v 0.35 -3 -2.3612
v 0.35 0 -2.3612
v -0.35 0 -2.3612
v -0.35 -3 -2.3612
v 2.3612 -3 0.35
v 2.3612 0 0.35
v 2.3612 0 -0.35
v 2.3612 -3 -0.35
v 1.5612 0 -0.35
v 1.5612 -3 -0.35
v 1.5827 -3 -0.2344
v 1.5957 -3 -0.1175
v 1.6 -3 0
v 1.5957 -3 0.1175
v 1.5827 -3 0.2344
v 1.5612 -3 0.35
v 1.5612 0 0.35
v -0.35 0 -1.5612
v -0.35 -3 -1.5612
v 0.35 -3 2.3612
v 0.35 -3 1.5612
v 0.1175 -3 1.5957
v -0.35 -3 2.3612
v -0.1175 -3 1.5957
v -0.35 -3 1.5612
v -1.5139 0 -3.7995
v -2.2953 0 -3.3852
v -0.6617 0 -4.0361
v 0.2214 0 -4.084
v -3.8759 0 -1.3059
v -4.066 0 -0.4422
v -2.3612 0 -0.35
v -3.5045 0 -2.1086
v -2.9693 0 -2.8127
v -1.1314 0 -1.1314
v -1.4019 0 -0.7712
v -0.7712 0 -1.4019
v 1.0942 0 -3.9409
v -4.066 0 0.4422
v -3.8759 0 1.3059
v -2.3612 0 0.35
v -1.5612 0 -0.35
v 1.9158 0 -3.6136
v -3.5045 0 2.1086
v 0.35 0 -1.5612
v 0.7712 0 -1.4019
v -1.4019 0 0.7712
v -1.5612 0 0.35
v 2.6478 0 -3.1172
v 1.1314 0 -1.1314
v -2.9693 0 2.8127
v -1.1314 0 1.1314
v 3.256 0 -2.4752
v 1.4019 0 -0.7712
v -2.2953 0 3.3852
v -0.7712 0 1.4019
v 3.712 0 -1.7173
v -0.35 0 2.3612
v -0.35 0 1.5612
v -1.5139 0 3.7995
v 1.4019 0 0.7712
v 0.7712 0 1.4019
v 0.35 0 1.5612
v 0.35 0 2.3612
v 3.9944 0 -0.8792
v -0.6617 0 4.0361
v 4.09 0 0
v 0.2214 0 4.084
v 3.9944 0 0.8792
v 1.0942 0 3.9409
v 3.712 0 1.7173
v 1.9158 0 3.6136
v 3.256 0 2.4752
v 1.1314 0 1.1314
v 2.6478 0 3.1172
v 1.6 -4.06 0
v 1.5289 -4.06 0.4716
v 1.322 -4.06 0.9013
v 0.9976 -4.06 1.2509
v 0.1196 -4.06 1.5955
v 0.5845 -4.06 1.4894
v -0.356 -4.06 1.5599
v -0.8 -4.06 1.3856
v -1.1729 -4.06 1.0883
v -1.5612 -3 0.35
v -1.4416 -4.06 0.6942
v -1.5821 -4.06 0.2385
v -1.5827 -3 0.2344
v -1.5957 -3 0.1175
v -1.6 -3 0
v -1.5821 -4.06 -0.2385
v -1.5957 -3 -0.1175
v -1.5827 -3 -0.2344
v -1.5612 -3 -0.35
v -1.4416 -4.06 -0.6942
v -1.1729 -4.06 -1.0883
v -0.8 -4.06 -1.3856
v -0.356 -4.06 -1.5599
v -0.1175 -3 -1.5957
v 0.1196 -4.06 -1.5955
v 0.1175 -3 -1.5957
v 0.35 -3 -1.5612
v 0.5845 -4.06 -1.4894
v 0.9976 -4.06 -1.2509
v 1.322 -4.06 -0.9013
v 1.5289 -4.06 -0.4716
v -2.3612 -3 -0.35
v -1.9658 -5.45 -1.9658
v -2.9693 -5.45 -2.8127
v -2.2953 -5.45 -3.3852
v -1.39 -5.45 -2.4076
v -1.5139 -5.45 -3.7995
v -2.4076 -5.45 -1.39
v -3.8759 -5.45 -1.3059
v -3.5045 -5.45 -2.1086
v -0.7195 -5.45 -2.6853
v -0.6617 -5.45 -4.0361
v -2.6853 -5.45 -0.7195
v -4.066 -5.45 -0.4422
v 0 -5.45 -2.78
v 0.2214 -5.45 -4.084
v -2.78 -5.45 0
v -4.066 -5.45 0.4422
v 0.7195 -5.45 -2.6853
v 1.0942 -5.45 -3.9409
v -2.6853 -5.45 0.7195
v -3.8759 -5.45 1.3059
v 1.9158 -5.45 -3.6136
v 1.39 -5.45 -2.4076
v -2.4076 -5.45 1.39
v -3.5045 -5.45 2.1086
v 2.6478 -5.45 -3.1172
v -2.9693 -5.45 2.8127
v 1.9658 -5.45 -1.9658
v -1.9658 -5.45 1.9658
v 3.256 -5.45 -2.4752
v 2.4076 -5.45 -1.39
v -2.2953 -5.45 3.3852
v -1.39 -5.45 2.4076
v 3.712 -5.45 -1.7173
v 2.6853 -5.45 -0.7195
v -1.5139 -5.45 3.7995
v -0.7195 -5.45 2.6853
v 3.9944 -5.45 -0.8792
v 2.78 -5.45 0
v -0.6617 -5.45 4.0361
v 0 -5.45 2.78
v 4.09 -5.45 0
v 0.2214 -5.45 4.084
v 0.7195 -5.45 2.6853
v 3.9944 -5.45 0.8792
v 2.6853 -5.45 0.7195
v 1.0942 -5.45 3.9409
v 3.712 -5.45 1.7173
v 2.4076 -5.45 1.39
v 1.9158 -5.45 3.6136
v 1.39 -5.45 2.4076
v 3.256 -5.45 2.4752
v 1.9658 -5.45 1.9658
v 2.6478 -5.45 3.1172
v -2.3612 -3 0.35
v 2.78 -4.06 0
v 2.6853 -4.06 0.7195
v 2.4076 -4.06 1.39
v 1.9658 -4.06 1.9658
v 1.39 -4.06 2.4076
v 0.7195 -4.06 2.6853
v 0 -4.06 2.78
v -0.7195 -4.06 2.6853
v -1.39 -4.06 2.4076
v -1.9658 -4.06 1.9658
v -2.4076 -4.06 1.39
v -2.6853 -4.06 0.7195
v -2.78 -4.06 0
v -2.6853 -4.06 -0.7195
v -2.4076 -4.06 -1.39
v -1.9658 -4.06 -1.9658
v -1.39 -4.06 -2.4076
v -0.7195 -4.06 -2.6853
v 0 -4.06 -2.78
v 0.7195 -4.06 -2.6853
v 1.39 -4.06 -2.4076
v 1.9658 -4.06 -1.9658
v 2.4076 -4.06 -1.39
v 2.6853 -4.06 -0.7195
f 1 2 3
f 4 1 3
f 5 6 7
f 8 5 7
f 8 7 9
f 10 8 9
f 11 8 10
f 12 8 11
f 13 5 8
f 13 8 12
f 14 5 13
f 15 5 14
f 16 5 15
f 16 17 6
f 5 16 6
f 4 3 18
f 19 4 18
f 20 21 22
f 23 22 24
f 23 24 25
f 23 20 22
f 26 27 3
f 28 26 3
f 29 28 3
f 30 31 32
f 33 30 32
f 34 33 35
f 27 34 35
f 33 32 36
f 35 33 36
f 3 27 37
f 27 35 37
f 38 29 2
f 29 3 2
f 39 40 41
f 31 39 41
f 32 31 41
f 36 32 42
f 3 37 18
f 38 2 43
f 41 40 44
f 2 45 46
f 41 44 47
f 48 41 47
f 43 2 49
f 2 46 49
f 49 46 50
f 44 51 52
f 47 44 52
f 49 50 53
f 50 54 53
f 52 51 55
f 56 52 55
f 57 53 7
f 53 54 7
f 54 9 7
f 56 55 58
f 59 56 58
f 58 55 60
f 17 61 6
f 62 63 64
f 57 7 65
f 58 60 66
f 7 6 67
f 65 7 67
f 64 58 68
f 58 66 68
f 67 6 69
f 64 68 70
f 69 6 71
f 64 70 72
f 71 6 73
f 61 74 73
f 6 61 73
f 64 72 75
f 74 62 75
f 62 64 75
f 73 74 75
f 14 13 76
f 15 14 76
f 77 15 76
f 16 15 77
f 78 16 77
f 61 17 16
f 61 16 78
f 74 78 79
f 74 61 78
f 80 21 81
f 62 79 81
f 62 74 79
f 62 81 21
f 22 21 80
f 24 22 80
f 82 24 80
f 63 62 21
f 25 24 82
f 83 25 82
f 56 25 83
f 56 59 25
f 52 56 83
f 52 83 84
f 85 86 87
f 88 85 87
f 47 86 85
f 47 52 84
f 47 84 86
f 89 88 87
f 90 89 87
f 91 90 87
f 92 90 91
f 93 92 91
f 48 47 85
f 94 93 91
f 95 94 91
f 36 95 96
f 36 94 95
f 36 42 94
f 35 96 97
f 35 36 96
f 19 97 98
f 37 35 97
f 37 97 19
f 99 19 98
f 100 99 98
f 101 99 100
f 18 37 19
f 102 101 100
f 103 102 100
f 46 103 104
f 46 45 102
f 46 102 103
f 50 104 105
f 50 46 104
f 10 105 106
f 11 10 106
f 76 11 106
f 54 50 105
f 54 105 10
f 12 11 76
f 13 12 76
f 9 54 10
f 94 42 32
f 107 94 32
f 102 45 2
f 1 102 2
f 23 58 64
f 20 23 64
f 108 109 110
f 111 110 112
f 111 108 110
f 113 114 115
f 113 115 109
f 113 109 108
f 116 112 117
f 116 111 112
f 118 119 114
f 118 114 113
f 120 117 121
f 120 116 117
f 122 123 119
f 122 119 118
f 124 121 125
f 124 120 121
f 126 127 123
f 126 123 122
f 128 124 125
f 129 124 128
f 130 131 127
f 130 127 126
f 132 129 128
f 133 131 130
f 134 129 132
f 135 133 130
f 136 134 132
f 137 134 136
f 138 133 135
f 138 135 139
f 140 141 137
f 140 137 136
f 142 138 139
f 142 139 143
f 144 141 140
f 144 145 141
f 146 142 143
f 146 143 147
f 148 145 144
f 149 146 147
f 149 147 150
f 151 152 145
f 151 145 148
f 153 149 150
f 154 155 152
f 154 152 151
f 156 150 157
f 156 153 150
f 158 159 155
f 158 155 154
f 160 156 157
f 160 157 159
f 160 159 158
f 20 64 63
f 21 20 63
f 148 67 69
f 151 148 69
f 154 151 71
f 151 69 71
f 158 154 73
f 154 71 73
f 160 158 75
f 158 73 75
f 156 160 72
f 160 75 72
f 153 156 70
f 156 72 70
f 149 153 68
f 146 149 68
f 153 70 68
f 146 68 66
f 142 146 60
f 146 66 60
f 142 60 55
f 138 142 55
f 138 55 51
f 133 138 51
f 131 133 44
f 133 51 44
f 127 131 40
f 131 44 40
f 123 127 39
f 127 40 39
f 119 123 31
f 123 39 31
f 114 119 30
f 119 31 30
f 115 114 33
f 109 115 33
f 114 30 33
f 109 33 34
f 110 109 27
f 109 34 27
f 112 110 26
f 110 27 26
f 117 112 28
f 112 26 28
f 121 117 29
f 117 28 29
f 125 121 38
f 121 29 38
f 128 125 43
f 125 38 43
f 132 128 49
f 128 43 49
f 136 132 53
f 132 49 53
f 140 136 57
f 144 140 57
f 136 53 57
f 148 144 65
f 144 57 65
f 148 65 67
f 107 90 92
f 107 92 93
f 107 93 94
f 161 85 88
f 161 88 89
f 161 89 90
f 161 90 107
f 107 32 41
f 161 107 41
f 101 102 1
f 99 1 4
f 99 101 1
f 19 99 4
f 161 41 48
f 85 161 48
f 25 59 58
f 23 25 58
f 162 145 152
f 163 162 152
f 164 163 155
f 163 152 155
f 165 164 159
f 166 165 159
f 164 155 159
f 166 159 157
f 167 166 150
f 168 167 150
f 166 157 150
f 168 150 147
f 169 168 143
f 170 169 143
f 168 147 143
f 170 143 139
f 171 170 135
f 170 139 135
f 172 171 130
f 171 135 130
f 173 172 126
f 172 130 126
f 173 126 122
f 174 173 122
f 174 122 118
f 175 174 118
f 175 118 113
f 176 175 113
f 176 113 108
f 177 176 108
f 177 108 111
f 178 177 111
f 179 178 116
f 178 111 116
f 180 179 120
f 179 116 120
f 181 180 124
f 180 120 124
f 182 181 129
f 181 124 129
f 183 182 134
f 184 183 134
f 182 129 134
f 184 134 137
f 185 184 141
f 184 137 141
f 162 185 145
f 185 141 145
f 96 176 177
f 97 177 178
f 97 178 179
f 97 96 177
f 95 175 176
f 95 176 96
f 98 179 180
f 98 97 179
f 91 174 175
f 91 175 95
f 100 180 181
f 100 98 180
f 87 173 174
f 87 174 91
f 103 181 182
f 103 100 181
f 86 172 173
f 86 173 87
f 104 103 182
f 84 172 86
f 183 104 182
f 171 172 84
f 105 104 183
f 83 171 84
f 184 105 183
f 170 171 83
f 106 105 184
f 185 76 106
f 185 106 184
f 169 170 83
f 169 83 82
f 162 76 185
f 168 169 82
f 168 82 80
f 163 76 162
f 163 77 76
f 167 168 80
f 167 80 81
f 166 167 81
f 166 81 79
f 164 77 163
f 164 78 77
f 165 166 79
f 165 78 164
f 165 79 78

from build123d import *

# Parameters (mm, degrees)
F0_R     = 4.09
F0_R_2   = 1.6
F1_DEPTH = 5.45
F2_R     = 2.78
F3_DEPTH = 1.39
F5_DEPTH = 3


with BuildPart() as f1:
    # F0 (on Front) → F1 (new body)
    with BuildSketch(Plane.XZ):
        Circle(F0_R)
        Circle(F0_R_2, mode=Mode.SUBTRACT)
    extrude(amount=F1_DEPTH)

    # F2 (on face) → F3 (cut)
    with BuildSketch(Plane.XZ.offset(5.45)):
        Circle(F2_R)
    extrude(amount=-F3_DEPTH, mode=Mode.SUBTRACT)

    # F4 (on face) → F5 (cut)
    with BuildSketch(Plane(origin=(0, 0, 0), x_dir=(-1, 0, 0), z_dir=(0, 1, 0))):
        with BuildLine():
            Line((-0.35, 2.3612494996), (-0.35, 1.5612494996))
            ThreePointArc((-0.35, 1.5612494996), (0, 1.6), (0.35, 1.5612494996))
            Line((0.35, 1.5612494996), (0.35, 2.3612494996))
            Line((0.35, 2.3612494996), (-0.35, 2.3612494996))
        make_face()
        with BuildLine():
            Line((2.3612494996, 0.35), (1.5612494996, 0.35))
            ThreePointArc((1.5612494996, 0.35), (1.5902828678, 0.1760693054), (1.6, 0))
            ThreePointArc((1.6, 0), (1.5902828678, -0.1760693054), (1.5612494996, -0.35))
            Line((1.5612494996, -0.35), (2.3612494996, -0.35))
            Line((2.3612494996, -0.35), (2.3612494996, 0.35))
        make_face()
        with BuildLine():
            ThreePointArc((0.35, -1.5612494996), (0, -1.6), (-0.35, -1.5612494996))
            Line((-0.35, -1.5612494996), (-0.35, -2.3612494996))
            Line((-0.35, -2.3612494996), (0.35, -2.3612494996))
            Line((0.35, -2.3612494996), (0.35, -1.5612494996))
        make_face()
        with BuildLine():
            ThreePointArc((-1.5612494996, -0.35), (-1.6, 0), (-1.5612494996, 0.35))
            Line((-1.5612494996, 0.35), (-2.3612494996, 0.35))
            Line((-2.3612494996, 0.35), (-2.3612494996, -0.35))
            Line((-2.3612494996, -0.35), (-1.5612494996, -0.35))
        make_face()
    extrude(amount=-F5_DEPTH, mode=Mode.SUBTRACT)


solid = f1.part
